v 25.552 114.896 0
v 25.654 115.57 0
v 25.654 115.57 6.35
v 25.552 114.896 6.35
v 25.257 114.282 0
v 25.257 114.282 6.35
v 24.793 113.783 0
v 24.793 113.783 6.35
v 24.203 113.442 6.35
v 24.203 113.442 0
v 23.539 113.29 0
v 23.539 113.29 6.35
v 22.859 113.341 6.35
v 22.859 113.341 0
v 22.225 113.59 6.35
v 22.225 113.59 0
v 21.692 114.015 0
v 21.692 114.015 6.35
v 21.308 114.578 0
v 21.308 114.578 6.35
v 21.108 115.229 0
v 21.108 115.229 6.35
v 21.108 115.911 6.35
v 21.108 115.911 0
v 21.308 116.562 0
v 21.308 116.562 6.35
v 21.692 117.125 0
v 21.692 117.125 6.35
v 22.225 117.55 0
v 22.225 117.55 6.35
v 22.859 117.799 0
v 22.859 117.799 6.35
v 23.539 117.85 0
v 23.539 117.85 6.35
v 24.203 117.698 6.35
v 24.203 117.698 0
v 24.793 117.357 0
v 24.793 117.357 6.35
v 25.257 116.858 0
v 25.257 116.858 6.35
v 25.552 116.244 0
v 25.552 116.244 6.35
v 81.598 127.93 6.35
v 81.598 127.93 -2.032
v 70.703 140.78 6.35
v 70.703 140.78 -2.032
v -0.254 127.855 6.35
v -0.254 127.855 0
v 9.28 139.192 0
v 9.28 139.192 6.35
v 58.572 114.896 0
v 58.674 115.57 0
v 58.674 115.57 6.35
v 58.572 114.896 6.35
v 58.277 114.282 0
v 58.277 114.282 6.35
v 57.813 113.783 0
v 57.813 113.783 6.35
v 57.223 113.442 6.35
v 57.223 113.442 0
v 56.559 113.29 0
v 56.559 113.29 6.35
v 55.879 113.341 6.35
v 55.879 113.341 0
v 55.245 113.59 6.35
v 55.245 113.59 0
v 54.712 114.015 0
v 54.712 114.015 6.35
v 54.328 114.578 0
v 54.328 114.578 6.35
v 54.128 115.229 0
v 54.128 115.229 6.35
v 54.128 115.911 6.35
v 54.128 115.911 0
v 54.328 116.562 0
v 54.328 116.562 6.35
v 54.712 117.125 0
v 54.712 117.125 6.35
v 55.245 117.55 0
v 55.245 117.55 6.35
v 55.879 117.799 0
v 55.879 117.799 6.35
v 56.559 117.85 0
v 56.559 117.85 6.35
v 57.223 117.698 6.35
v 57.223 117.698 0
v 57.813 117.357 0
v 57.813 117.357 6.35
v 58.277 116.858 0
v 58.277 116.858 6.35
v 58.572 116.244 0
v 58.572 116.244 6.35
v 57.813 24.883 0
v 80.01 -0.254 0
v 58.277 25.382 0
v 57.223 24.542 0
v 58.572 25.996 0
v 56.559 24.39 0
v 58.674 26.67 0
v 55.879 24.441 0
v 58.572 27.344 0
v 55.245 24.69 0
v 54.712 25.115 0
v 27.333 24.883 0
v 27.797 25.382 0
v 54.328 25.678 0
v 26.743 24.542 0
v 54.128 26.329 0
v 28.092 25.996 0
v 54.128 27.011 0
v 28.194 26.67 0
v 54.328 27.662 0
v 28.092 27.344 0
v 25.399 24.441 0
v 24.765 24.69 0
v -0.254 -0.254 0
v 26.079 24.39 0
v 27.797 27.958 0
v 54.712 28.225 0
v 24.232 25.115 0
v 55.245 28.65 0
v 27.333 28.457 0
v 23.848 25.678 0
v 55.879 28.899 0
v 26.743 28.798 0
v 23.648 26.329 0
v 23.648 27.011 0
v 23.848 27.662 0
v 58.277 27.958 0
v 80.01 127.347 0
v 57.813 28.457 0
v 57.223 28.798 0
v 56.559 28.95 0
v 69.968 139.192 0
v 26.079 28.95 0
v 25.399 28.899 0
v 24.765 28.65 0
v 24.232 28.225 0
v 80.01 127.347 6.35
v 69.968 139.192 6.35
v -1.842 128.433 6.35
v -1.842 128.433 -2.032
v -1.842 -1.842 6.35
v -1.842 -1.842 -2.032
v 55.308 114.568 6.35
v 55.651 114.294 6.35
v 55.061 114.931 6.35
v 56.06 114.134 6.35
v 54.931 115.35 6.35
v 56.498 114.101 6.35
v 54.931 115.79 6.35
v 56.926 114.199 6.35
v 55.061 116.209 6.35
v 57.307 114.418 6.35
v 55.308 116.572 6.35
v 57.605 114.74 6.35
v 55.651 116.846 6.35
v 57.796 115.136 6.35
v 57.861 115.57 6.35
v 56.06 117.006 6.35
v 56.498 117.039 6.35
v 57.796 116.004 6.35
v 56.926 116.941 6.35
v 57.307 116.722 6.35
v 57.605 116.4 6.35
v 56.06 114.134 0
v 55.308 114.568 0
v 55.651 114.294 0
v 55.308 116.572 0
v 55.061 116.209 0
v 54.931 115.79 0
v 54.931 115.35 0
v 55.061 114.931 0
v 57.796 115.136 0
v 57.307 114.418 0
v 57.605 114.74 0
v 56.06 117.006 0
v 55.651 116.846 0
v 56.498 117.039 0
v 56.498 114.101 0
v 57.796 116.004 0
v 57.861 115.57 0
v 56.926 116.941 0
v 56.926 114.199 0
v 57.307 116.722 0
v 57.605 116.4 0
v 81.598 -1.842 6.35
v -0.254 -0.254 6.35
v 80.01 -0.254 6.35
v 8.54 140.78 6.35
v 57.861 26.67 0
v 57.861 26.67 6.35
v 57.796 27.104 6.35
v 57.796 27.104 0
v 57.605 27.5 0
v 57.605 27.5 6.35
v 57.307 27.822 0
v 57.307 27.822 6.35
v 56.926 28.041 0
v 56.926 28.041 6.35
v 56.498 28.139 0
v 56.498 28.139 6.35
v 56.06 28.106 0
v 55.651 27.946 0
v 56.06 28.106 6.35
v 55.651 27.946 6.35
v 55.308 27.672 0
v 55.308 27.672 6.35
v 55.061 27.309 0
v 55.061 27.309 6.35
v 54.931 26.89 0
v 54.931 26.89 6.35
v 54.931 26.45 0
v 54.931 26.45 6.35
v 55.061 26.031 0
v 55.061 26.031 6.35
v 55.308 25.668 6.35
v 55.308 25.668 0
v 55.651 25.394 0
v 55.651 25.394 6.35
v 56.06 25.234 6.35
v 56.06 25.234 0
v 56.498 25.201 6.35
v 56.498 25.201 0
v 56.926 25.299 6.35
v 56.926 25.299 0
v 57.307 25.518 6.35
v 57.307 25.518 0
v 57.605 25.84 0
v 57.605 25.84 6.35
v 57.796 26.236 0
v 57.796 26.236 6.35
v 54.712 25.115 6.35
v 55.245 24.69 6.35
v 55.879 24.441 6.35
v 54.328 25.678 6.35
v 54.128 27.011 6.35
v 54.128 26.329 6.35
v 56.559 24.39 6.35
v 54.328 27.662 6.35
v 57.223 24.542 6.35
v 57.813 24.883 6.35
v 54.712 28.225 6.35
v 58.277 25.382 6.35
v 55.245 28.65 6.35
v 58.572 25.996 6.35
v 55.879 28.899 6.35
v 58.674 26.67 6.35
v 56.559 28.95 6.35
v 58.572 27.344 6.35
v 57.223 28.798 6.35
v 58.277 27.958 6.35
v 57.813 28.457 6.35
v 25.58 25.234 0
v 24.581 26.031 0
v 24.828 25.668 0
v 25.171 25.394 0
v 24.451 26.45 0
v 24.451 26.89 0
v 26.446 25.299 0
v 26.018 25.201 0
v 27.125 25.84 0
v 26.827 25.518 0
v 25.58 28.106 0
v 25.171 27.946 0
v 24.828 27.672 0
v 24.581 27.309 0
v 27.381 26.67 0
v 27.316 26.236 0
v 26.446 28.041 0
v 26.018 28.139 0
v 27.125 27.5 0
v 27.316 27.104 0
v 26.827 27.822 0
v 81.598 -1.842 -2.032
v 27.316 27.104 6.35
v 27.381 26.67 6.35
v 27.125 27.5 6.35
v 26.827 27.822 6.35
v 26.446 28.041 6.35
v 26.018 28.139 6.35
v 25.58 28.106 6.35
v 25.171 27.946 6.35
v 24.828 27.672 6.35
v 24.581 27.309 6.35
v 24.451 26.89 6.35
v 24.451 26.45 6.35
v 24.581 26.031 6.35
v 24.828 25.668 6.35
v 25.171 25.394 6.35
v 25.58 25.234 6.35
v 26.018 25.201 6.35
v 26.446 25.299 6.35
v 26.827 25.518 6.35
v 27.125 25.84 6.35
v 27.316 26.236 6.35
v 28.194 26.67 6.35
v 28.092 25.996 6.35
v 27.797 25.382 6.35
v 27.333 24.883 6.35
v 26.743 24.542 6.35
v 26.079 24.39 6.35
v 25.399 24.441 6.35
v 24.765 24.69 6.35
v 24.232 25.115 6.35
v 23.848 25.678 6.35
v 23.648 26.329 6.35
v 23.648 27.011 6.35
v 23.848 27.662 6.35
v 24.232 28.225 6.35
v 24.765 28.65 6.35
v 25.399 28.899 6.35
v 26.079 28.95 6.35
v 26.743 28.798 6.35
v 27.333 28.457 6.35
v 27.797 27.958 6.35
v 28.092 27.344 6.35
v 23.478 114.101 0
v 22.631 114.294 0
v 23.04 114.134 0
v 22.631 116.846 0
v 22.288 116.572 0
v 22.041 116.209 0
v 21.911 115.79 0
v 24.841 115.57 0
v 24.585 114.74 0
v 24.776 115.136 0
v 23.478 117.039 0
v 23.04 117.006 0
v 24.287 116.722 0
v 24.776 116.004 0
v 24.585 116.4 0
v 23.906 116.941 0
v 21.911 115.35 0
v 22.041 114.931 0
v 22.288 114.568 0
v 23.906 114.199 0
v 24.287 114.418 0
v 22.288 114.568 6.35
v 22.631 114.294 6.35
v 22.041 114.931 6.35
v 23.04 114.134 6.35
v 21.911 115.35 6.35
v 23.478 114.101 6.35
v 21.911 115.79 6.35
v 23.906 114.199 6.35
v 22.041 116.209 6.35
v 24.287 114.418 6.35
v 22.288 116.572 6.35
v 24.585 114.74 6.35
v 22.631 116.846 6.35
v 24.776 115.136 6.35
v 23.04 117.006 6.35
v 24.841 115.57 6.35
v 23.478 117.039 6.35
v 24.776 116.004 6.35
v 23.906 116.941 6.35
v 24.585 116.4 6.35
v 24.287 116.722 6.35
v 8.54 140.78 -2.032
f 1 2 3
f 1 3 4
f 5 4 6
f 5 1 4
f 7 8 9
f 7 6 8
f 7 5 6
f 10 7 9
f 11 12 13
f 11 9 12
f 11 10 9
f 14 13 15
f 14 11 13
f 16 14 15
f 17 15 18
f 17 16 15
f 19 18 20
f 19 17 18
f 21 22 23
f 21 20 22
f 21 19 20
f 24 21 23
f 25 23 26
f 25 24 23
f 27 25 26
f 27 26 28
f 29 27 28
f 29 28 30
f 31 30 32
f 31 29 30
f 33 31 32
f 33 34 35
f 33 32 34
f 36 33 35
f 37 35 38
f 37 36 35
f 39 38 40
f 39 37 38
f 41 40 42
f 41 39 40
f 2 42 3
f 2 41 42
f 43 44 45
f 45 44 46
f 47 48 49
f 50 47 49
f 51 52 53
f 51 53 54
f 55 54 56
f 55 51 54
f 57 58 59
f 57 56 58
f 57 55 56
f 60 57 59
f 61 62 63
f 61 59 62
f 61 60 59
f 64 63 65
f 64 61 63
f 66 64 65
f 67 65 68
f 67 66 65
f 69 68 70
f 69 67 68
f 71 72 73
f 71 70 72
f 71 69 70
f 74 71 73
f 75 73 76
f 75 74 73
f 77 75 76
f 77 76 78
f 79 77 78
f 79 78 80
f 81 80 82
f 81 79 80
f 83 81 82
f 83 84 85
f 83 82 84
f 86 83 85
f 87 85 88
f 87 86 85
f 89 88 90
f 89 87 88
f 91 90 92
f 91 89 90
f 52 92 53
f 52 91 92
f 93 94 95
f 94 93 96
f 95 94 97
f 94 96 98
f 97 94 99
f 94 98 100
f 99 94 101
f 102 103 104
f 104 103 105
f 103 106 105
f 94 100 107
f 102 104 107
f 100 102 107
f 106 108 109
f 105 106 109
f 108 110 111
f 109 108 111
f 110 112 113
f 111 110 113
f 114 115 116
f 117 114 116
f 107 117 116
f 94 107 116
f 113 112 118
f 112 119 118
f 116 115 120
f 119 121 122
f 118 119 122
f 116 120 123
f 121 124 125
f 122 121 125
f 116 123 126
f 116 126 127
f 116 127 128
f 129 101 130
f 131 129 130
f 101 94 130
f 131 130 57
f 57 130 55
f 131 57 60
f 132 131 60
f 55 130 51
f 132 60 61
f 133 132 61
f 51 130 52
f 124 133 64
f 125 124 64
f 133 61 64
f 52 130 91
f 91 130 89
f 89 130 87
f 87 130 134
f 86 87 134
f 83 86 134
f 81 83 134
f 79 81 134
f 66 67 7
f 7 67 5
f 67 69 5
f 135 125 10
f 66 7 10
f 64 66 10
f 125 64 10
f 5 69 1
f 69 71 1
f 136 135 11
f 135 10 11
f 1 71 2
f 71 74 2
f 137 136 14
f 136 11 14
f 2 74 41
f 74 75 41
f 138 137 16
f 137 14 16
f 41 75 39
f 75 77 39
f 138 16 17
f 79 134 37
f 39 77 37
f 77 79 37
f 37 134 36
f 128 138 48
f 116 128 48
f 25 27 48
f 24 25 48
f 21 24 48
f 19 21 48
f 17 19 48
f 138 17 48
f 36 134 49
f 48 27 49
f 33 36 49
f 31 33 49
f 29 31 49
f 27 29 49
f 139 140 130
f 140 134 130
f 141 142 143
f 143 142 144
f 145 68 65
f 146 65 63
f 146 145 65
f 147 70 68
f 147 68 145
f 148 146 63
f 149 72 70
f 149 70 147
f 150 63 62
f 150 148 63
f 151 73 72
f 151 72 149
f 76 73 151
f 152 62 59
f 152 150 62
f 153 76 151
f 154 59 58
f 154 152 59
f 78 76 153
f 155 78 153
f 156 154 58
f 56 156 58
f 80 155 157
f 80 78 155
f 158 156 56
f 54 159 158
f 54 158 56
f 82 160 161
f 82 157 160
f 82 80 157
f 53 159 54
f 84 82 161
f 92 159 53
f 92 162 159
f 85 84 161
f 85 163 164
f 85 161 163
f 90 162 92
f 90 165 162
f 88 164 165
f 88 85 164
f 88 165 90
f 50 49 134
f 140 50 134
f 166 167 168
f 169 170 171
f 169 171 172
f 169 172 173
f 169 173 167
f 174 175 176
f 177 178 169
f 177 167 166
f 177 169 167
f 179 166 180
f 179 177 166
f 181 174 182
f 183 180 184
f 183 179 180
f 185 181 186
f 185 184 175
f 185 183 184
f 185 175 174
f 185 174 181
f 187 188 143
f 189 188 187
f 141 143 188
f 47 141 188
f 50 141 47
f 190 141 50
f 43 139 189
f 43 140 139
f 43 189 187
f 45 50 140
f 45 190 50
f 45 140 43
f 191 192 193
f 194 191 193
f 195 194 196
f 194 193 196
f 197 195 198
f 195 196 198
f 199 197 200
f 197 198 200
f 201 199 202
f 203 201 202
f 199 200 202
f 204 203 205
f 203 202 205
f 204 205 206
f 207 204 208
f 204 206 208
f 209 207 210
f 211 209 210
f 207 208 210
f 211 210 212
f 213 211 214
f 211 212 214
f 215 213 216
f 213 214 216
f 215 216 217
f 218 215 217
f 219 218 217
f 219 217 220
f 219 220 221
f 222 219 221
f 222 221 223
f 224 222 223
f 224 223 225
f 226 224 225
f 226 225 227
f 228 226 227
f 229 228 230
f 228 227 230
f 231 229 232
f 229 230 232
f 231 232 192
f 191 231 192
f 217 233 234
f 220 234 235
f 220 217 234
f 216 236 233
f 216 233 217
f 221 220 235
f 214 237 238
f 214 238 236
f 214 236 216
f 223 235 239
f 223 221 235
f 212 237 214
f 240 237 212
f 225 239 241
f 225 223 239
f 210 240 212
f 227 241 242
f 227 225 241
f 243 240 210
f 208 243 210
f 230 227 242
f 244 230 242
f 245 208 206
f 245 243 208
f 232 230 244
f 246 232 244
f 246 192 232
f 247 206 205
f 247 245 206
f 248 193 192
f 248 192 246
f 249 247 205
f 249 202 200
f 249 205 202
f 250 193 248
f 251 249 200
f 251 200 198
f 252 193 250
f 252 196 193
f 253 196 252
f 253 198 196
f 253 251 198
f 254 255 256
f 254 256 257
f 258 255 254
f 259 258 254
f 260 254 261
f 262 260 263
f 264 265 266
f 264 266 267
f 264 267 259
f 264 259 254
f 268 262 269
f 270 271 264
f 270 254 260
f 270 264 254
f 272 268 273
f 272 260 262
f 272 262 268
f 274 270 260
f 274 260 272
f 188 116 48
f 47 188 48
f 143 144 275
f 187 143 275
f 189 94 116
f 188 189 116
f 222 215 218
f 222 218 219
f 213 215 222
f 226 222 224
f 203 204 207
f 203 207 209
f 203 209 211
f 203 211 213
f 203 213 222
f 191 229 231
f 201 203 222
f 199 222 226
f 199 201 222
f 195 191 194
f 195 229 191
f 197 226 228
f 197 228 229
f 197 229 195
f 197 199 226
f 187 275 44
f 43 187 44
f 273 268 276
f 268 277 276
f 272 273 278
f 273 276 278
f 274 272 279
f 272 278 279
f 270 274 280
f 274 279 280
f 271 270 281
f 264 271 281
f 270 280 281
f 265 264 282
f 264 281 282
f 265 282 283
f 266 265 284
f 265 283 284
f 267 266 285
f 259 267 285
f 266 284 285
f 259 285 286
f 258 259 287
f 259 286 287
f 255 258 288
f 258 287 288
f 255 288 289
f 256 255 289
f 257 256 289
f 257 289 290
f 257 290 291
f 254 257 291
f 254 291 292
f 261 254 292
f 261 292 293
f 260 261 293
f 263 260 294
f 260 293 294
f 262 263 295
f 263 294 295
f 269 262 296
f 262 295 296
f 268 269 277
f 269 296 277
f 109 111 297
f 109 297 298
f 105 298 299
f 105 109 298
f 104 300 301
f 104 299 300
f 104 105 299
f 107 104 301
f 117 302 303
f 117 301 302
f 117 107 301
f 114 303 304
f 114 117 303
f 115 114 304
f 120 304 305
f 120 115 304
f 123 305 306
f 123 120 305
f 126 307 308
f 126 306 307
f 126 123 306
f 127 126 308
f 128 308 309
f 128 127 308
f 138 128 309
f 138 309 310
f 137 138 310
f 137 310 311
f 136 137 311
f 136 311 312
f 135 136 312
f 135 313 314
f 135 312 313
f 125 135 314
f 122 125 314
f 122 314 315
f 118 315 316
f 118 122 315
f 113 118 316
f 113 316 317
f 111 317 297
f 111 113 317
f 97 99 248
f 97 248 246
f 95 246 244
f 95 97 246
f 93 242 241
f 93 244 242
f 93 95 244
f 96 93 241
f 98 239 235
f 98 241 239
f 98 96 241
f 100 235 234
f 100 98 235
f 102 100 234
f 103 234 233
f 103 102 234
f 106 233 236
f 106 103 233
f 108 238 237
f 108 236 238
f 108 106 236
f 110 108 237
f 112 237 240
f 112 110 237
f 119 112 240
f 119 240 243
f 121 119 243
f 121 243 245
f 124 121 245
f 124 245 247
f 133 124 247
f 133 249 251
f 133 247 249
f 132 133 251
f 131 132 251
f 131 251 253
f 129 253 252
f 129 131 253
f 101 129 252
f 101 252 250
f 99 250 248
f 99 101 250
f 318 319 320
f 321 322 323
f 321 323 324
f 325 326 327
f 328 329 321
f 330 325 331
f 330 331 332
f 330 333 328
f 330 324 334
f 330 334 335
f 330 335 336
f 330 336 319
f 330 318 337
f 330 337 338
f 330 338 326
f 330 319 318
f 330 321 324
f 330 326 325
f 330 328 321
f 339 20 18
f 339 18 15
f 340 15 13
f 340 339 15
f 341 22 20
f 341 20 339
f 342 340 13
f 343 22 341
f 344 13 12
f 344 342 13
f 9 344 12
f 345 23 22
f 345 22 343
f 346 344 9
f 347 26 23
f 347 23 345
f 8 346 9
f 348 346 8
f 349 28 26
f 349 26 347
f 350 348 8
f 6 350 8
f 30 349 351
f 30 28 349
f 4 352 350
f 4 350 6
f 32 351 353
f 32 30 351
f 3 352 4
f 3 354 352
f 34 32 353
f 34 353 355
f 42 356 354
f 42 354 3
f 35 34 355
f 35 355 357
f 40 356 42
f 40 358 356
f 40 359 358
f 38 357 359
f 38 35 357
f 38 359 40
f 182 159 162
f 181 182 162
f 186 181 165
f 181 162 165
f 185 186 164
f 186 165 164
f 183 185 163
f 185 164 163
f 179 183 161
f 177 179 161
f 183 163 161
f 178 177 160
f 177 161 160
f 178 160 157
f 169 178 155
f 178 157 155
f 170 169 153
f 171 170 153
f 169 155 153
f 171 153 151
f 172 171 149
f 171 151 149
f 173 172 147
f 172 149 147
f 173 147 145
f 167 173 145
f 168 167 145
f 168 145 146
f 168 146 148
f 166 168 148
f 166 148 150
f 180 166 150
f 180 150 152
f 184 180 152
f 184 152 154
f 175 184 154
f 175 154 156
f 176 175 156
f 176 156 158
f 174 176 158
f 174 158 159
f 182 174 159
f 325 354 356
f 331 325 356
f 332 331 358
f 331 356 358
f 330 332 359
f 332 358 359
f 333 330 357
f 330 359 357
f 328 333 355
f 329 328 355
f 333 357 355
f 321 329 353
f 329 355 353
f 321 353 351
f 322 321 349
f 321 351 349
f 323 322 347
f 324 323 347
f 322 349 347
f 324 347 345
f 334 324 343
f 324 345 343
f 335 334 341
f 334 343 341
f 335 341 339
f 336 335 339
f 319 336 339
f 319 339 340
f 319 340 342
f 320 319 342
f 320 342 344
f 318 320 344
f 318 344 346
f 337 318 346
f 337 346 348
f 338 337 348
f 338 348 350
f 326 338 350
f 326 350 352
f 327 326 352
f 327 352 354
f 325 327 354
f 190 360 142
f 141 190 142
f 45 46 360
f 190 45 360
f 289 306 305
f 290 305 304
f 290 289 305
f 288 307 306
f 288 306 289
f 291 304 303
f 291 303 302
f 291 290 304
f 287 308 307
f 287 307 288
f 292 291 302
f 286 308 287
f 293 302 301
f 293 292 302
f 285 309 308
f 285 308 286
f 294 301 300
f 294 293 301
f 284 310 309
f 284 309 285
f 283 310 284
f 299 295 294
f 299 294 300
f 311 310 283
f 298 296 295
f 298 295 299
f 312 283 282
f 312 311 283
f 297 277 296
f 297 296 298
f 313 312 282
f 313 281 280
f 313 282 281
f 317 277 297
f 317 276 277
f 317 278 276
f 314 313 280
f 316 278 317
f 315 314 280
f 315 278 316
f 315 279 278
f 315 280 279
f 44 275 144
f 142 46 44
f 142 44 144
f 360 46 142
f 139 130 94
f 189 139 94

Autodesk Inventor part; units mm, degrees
ref_plane "YZ Plane" through (0, 0, 0) normal (1, 0, 0) x (0, 1, 0)
ref_plane "XZ Plane" through (0, 0, 0) normal (0, 1, 0) x (-1, 0, 0)
ref_plane "XY Plane" through (0, 0, 0) normal (0, 0, 1) x (1, 0, 0)
sketch "Sketch1" plane through (0, 0, 0) normal (0, 0, 1) x (1, 0, 0)
  line L0 (79.756, 127.254) -> (79.756, 0)
  line L1 (69.85, 138.938) -> (79.756, 127.254)
  line L2 (9.398, 138.938) -> (69.85, 138.938)
  line L3 (0, 127.762) -> (9.398, 138.938)
  line L4 (0, 0) -> (0, 127.762)
  line L5 (79.756, 0) -> (0, 0)
  circle A0 centre (28.448, 132.08) radius 0.51
  circle A1 centre (20.828, 132.08) radius 0.51
  circle A2 centre (22.988, 132.08) radius 0.55
  circle A3 centre (23.368, 115.57) radius 2.54
  circle A4 centre (13.208, 129.54) radius 0.51
  circle A5 centre (6.858, 101.6) radius 0.51
  circle A6 centre (9.398, 101.6) radius 0.51
  circle A7 centre (6.858, 103.76) radius 0.55
  circle A8 centre (9.398, 109.22) radius 0.51
  circle A9 centre (6.858, 109.22) radius 0.51
  circle A10 centre (6.858, 111.38) radius 0.55
  circle A11 centre (6.858, 124.46) radius 0.51
  circle A12 centre (9.398, 124.46) radius 0.51
  circle A13 centre (9.398, 116.84) radius 0.51
  circle A14 centre (6.858, 116.84) radius 0.51
  circle A15 centre (6.858, 119) radius 0.55
  circle A16 centre (6.858, 126.62) radius 0.55
  circle A17 centre (6.858, 96.14) radius 0.55
  circle A18 centre (6.858, 88.52) radius 0.55
  circle A19 centre (9.398, 93.98) radius 0.51
  circle A20 centre (6.858, 93.98) radius 0.51
  circle A21 centre (6.858, 39.37) radius 0.51
  circle A22 centre (6.858, 41.53) radius 0.55
  circle A23 centre (6.858, 49.15) radius 0.55
  circle A24 centre (6.858, 46.99) radius 0.51
  circle A25 centre (6.858, 54.61) radius 0.51
  circle A26 centre (6.858, 56.77) radius 0.55
  circle A27 centre (6.858, 80.9) radius 0.55
  circle A28 centre (6.858, 78.74) radius 0.51
  circle A29 centre (6.858, 73.28) radius 0.55
  circle A30 centre (6.858, 64.39) radius 0.55
  circle A31 centre (6.858, 71.12) radius 0.51
  circle A32 centre (6.858, 62.23) radius 0.51
  circle A33 centre (9.398, 71.12) radius 0.51
  circle A34 centre (9.398, 62.23) radius 0.51
  circle A35 centre (9.398, 39.37) radius 0.51
  circle A36 centre (9.398, 46.99) radius 0.51
  circle A37 centre (9.398, 54.61) radius 0.51
  circle A38 centre (9.398, 78.74) radius 0.51
  circle A39 centre (6.858, 86.36) radius 0.51
  circle A40 centre (9.398, 86.36) radius 0.51
  circle A41 centre (1.778, 78.74) radius 0.51
  circle A42 centre (1.778, 86.36) radius 0.51
  circle A43 centre (1.778, 109.22) radius 0.51
  circle A44 centre (1.778, 101.6) radius 0.51
  circle A45 centre (1.778, 93.98) radius 0.51
  circle A46 centre (4.318, 78.74) radius 0.51
  circle A47 centre (4.318, 86.36) radius 0.51
  circle A48 centre (4.318, 109.22) radius 0.51
  circle A49 centre (4.318, 101.6) radius 0.51
  circle A50 centre (4.318, 93.98) radius 0.51
  circle A51 centre (4.318, 39.37) radius 0.51
  circle A52 centre (1.778, 39.37) radius 0.51
  circle A53 centre (1.778, 54.61) radius 0.51
  circle A54 centre (4.318, 54.61) radius 0.51
  circle A55 centre (4.318, 46.99) radius 0.51
  circle A56 centre (1.778, 46.99) radius 0.51
  circle A57 centre (1.778, 71.12) radius 0.51
  circle A58 centre (4.318, 71.12) radius 0.51
  circle A59 centre (1.778, 62.23) radius 0.51
  circle A60 centre (4.318, 62.23) radius 0.51
  circle A61 centre (4.318, 124.46) radius 0.51
  circle A62 centre (4.318, 116.84) radius 0.51
  circle A63 centre (1.778, 116.84) radius 0.51
  circle A64 centre (1.778, 124.46) radius 0.51
  circle A65 centre (33.528, 40.64) radius 0.5
  circle A66 centre (36.068, 137.16) radius 0.51
  circle A67 centre (36.068, 134.62) radius 0.51
  circle A68 centre (36.068, 132.08) radius 0.51
  circle A69 centre (36.068, 129.54) radius 0.51
  circle A70 centre (33.528, 76.2) radius 0.5
  circle A71 centre (33.528, 78.74) radius 0.5
  circle A72 centre (33.528, 81.28) radius 0.5
  circle A73 centre (33.528, 88.9) radius 0.5
  circle A74 centre (33.528, 86.36) radius 0.5
  circle A75 centre (33.528, 83.82) radius 0.5
  circle A76 centre (33.528, 93.98) radius 0.5
  circle A77 centre (33.528, 91.44) radius 0.5
  circle A78 centre (33.528, 96.52) radius 0.5
  circle A79 centre (33.528, 99.06) radius 0.5
  circle A80 centre (33.528, 45.72) radius 0.5
  circle A81 centre (33.528, 48.26) radius 0.5
  circle A82 centre (33.528, 53.34) radius 0.5
  circle A83 centre (33.528, 50.8) radius 0.5
  circle A84 centre (33.528, 58.42) radius 0.5
  circle A85 centre (33.528, 55.88) radius 0.5
  circle A86 centre (33.528, 73.66) radius 0.5
  circle A87 centre (33.528, 71.12) radius 0.5
  circle A88 centre (33.528, 68.58) radius 0.5
  circle A89 centre (33.528, 63.5) radius 0.5
  circle A90 centre (33.528, 66.04) radius 0.5
  circle A91 centre (33.528, 60.96) radius 0.5
  circle A92 centre (30.608, 132.08) radius 0.55
  circle A93 centre (33.528, 43.18) radius 0.5
  circle A94 centre (13.208, 134.62) radius 0.51
  circle A95 centre (20.828, 134.62) radius 0.51
  circle A96 centre (15.368, 132.08) radius 0.55
  circle A97 centre (13.208, 132.08) radius 0.51
  circle A98 centre (20.828, 129.54) radius 0.51
  circle A99 centre (13.208, 137.16) radius 0.51
  circle A100 centre (20.828, 137.16) radius 0.51
  circle A101 centre (28.448, 137.16) radius 0.51
  circle A102 centre (28.448, 134.62) radius 0.51
  circle A103 centre (28.448, 129.54) radius 0.51
  circle A104 centre (77.978, 44.45) radius 0.51
  circle A105 centre (75.438, 46.61) radius 0.55
  circle A106 centre (75.438, 44.45) radius 0.51
  circle A107 centre (75.438, 54.23) radius 0.55
  circle A108 centre (75.438, 52.07) radius 0.51
  circle A109 centre (77.978, 52.07) radius 0.51
  circle A110 centre (77.978, 60.96) radius 0.51
  circle A111 centre (75.438, 60.96) radius 0.51
  circle A112 centre (75.438, 63.12) radius 0.55
  circle A113 centre (70.358, 52.07) radius 0.51
  circle A114 centre (70.358, 44.45) radius 0.51
  circle A115 centre (70.358, 60.96) radius 0.51
  circle A116 centre (72.898, 60.96) radius 0.51
  circle A117 centre (72.898, 44.45) radius 0.51
  circle A118 centre (72.898, 52.07) radius 0.51
  circle A119 centre (70.358, 68.326) radius 0.51
  circle A120 centre (72.898, 68.326) radius 0.51
  circle A121 centre (77.978, 68.326) radius 0.51
  circle A122 centre (75.438, 68.326) radius 0.51
  circle A123 centre (75.438, 79.376) radius 0.55
  circle A124 centre (75.438, 77.216) radius 0.51
  circle A125 centre (77.978, 77.216) radius 0.51
  circle A126 centre (75.438, 70.486) radius 0.55
  circle A127 centre (72.898, 77.216) radius 0.51
  circle A128 centre (70.358, 77.216) radius 0.51
  circle A129 centre (48.768, 78.74) radius 0.5
  circle A130 centre (48.768, 76.2) radius 0.5
  circle A131 centre (48.768, 73.66) radius 0.5
  circle A132 centre (48.768, 68.58) radius 0.5
  circle A133 centre (48.768, 71.12) radius 0.5
  circle A134 centre (48.768, 66.04) radius 0.5
  circle A135 centre (48.768, 50.8) radius 0.5
  circle A136 centre (48.768, 53.34) radius 0.5
  circle A137 centre (48.768, 58.42) radius 0.5
  circle A138 centre (48.768, 55.88) radius 0.5
  circle A139 centre (48.768, 63.5) radius 0.5
  circle A140 centre (48.768, 60.96) radius 0.5
  circle A141 centre (48.768, 48.26) radius 0.5
  circle A142 centre (48.768, 45.72) radius 0.5
  circle A143 centre (75.438, 103.506) radius 0.55
  circle A144 centre (75.438, 101.346) radius 0.51
  circle A145 centre (72.898, 101.346) radius 0.51
  circle A146 centre (75.438, 95.886) radius 0.55
  circle A147 centre (72.898, 86.106) radius 0.51
  circle A148 centre (75.438, 88.266) radius 0.55
  circle A149 centre (75.438, 86.106) radius 0.51
  circle A150 centre (75.438, 93.726) radius 0.51
  circle A151 centre (72.898, 93.726) radius 0.51
  circle A152 centre (70.358, 93.726) radius 0.51
  circle A153 centre (70.358, 101.346) radius 0.51
  circle A154 centre (70.358, 86.106) radius 0.51
  circle A155 centre (48.768, 86.36) radius 0.5
  circle A156 centre (48.768, 88.9) radius 0.5
  circle A157 centre (48.768, 91.44) radius 0.5
  circle A158 centre (48.768, 96.52) radius 0.5
  circle A159 centre (48.768, 93.98) radius 0.5
  circle A160 centre (48.768, 99.06) radius 0.5
  circle A161 centre (77.978, 93.726) radius 0.51
  circle A162 centre (77.978, 86.106) radius 0.51
  circle A163 centre (77.978, 101.346) radius 0.51
  circle A164 centre (48.768, 83.82) radius 0.5
  circle A165 centre (48.768, 81.28) radius 0.5
  circle A166 centre (66.548, 129.54) radius 0.51
  circle A167 centre (58.928, 129.54) radius 0.51
  circle A168 centre (51.308, 129.54) radius 0.51
  circle A169 centre (70.358, 123.952) radius 0.51
  circle A170 centre (72.898, 116.586) radius 0.51
  circle A171 centre (70.358, 116.586) radius 0.51
  circle A172 centre (72.898, 123.952) radius 0.51
  circle A173 centre (56.388, 115.57) radius 2.54
  circle A174 centre (77.978, 116.586) radius 0.51
  circle A175 centre (75.438, 116.586) radius 0.51
  circle A176 centre (75.438, 118.746) radius 0.55
  circle A177 centre (75.438, 126.112) radius 0.55
  circle A178 centre (75.438, 123.952) radius 0.51
  circle A179 centre (77.978, 123.952) radius 0.51
  circle A180 centre (75.438, 108.966) radius 0.51
  circle A181 centre (77.978, 108.966) radius 0.51
  circle A182 centre (72.898, 108.966) radius 0.51
  circle A183 centre (75.438, 111.126) radius 0.55
  circle A184 centre (70.358, 108.966) radius 0.51
  circle A185 centre (51.308, 137.16) radius 0.51
  circle A186 centre (51.308, 134.62) radius 0.51
  circle A187 centre (58.928, 137.16) radius 0.51
  circle A188 centre (58.928, 134.62) radius 0.51
  circle A189 centre (66.548, 134.62) radius 0.51
  circle A190 centre (66.548, 137.16) radius 0.51
  circle A191 centre (53.468, 132.08) radius 0.55
  circle A192 centre (61.088, 132.08) radius 0.55
  circle A193 centre (58.928, 132.08) radius 0.51
  circle A194 centre (51.308, 132.08) radius 0.51
  circle A195 centre (66.548, 132.08) radius 0.51
  circle A196 centre (68.708, 132.08) radius 0.55
  circle A197 centre (43.688, 129.54) radius 0.51
  circle A198 centre (43.688, 132.08) radius 0.51
  circle A199 centre (43.688, 134.62) radius 0.51
  circle A200 centre (45.848, 132.08) radius 0.55
  circle A201 centre (43.688, 137.16) radius 0.51
  circle A202 centre (48.768, 43.18) radius 0.5
  circle A203 centre (38.228, 132.08) radius 0.55
  circle A204 centre (48.768, 40.64) radius 0.5
  circle A205 centre (4.318, 12.7) radius 0.51
  circle A206 centre (6.858, 14.86) radius 0.55
  circle A207 centre (6.858, 12.7) radius 0.51
  circle A208 centre (9.398, 12.7) radius 0.51
  circle A209 centre (32.258, 14.732) radius 0.89
  circle A210 centre (37.338, 14.732) radius 0.89
  circle A211 centre (77.978, 19.05) radius 0.51
  circle A212 centre (75.438, 19.05) radius 0.51
  circle A213 centre (75.438, 13.59) radius 0.55
  circle A214 centre (70.358, 19.05) radius 0.51
  circle A215 centre (72.898, 19.05) radius 0.51
  circle A216 centre (42.418, 14.732) radius 0.89
  circle A217 centre (47.498, 14.732) radius 0.89
  circle A218 centre (4.318, 21.59) radius 0.51
  circle A219 centre (6.858, 21.59) radius 0.51
  circle A220 centre (9.398, 21.59) radius 0.51
  circle A221 centre (9.398, 30.48) radius 0.51
  circle A222 centre (25.908, 26.67) radius 2.54
  circle A223 centre (77.978, 26.67) radius 0.51
  circle A224 centre (75.438, 26.67) radius 0.51
  circle A225 centre (70.358, 26.67) radius 0.51
  circle A226 centre (72.898, 26.67) radius 0.51
  circle A227 centre (75.438, 28.83) radius 0.55
  circle A228 centre (56.388, 26.67) radius 2.5527
  circle A229 centre (75.438, 21.21) radius 0.55
  circle A230 centre (4.318, 30.48) radius 0.51
  circle A231 centre (6.858, 30.48) radius 0.51
  circle A232 centre (6.858, 23.75) radius 0.55
  circle A233 centre (70.358, 35.56) radius 0.51
  circle A234 centre (72.898, 35.56) radius 0.51
  circle A235 centre (77.978, 35.56) radius 0.51
  circle A236 centre (75.438, 35.56) radius 0.51
  circle A237 centre (6.858, 32.64) radius 0.55
  circle A238 centre (1.778, 30.48) radius 0.51
  circle A239 centre (1.778, 21.59) radius 0.51
  circle A240 centre (1.778, 12.7) radius 0.51
  circle A241 centre (75.438, 37.72) radius 0.55
  circle A242 centre (72.898, 3.81) radius 0.51
  circle A243 centre (77.978, 3.81) radius 0.51
  circle A244 centre (75.438, 3.81) radius 0.51
  circle A245 centre (75.438, 5.97) radius 0.55
  circle A246 centre (70.358, 3.81) radius 0.51
  circle A247 centre (6.858, 7.24) radius 0.55
  circle A248 centre (6.858, 5.08) radius 0.51
  circle A249 centre (9.398, 5.08) radius 0.51
  circle A250 centre (1.778, 5.08) radius 0.51
  circle A251 centre (4.318, 5.08) radius 0.51
  circle A252 centre (75.438, 11.43) radius 0.51
  circle A253 centre (72.898, 11.43) radius 0.51
  circle A254 centre (70.358, 11.43) radius 0.51
  circle A255 centre (77.978, 11.43) radius 0.51
  point P0 (-85.852, 184.15)
sketch "Sketch2" plane through (0, 0, 0) normal (0, 0, 1) x (1, 0, 0)
  circle A0 centre (23.368, 115.57) radius 2.54 projected
  circle A1 centre (56.388, 115.57) radius 2.54 projected
  line L0 (0, 127.762) -> (9.398, 138.938) projected
  line L1 (9.398, 138.938) -> (69.85, 138.938) projected
  line L2 (0, 0) -> (0, 127.762) projected
  line L3 (69.85, 138.938) -> (79.756, 127.254) projected
  line L4 (79.756, 127.254) -> (79.756, 0) projected
  line L5 (79.756, 0) -> (0, 0) projected
  circle A2 centre (25.908, 26.67) radius 2.54 projected
  circle A3 centre (56.388, 26.67) radius 2.5527 projected
  circle A4 centre (23.368, 115.57) radius 2.286
  circle A5 centre (56.388, 115.57) radius 2.286
  circle A6 centre (25.908, 26.67) radius 2.286
  circle A7 centre (56.388, 26.67) radius 2.286
  line L6 (-0.254, 127.8546) -> (9.2797, 139.192)
  line L7 (9.2797, 139.192) -> (69.9677, 139.192)
  line L8 (69.9677, 139.192) -> (80.01, 127.3472)
  line L9 (80.01, 127.3472) -> (80.01, -0.254)
  line L10 (80.01, -0.254) -> (-0.254, -0.254)
  line L11 (-0.254, -0.254) -> (-0.254, 127.8546)
  line L12 (8.5405, 140.7795) -> (-1.8415, 128.4334)
  line L13 (-1.8415, 128.4334) -> (-1.8415, -1.8415)
  line L14 (-1.8415, -1.8415) -> (81.5975, -1.8415)
  line L15 (81.5975, -1.8415) -> (81.5975, 127.9296)
  line L16 (81.5975, 127.9296) -> (70.703, 140.7795)
  line L17 (70.703, 140.7795) -> (8.5405, 140.7795)
  dimension "d528" = 0.254
  dimension "d532" = 0.254
  dimension "d533" = 1.5875
extrude "Extrusion1" add sketch "Sketch2" along normal blind 6.35 contours A4 | A5 | A6 | A7 | L17 L16 L15 L14 L13 L12
sketch "Sketch4" plane through (0, 0, 0) normal (0, 0, -1) x (-1, 0, 0)
  line L0 (1.8415, 128.4334) -> (1.8415, -1.8415) projected
  line L1 (-8.5405, 140.7795) -> (1.8415, 128.4334) projected
  line L2 (-70.703, 140.7795) -> (-8.5405, 140.7795) projected
  line L3 (-81.5975, 127.9296) -> (-70.703, 140.7795) projected
  line L4 (-81.5975, -1.8415) -> (-81.5975, 127.9296) projected
  line L5 (1.8415, -1.8415) -> (-81.5975, -1.8415) projected
  line L6 (0.254, 127.8546) -> (-9.2797, 139.192) projected
  line L7 (0.254, -0.254) -> (0.254, 127.8546) projected
  line L8 (-80.01, -0.254) -> (0.254, -0.254) projected
  line L9 (-80.01, 127.3472) -> (-80.01, -0.254) projected
  line L10 (-69.9677, 139.192) -> (-80.01, 127.3472) projected
  line L11 (-9.2797, 139.192) -> (-69.9677, 139.192) projected
  point P0 (0, 0)
extrude "Extrusion3" add sketch "Sketch4" along normal blind 2.032 contours L0 L5 L4 L3 L2 L1 | L7 L8 L9 L10 L11 L6
sketch "Sketch5" plane through (23.368, 115.57, 6.35) normal (0, 0, 1) x (1, 0, 0)
  circle A0 centre (0, 0) radius 2.286 construction
  circle A1 centre (33.02, 0) radius 2.286 construction
  circle A2 centre (2.54, -88.9) radius 2.286 construction
  circle A3 centre (33.02, -88.9) radius 2.286 construction
  circle A4 centre (0, 0) radius 2.286 projected
  circle A5 centre (0, 0) radius 1.4732
  circle A6 centre (33.02, 0) radius 2.286 projected
  circle A7 centre (33.02, 0) radius 1.4732
  circle A8 centre (33.02, -88.9) radius 2.286 projected
  circle A9 centre (33.02, -88.9) radius 1.4732
  circle A10 centre (2.54, -88.9) radius 1.4732
  point P0 (-23.368, -115.57)
  dimension "d540" = 2.9464
extrude "Extrusion4" cut sketch "Sketch5" against normal up to surface (6.35 mm away) contours A5 | A7 | A9 | A10
properties part number "CaseV1" material "ABS Plastic"
